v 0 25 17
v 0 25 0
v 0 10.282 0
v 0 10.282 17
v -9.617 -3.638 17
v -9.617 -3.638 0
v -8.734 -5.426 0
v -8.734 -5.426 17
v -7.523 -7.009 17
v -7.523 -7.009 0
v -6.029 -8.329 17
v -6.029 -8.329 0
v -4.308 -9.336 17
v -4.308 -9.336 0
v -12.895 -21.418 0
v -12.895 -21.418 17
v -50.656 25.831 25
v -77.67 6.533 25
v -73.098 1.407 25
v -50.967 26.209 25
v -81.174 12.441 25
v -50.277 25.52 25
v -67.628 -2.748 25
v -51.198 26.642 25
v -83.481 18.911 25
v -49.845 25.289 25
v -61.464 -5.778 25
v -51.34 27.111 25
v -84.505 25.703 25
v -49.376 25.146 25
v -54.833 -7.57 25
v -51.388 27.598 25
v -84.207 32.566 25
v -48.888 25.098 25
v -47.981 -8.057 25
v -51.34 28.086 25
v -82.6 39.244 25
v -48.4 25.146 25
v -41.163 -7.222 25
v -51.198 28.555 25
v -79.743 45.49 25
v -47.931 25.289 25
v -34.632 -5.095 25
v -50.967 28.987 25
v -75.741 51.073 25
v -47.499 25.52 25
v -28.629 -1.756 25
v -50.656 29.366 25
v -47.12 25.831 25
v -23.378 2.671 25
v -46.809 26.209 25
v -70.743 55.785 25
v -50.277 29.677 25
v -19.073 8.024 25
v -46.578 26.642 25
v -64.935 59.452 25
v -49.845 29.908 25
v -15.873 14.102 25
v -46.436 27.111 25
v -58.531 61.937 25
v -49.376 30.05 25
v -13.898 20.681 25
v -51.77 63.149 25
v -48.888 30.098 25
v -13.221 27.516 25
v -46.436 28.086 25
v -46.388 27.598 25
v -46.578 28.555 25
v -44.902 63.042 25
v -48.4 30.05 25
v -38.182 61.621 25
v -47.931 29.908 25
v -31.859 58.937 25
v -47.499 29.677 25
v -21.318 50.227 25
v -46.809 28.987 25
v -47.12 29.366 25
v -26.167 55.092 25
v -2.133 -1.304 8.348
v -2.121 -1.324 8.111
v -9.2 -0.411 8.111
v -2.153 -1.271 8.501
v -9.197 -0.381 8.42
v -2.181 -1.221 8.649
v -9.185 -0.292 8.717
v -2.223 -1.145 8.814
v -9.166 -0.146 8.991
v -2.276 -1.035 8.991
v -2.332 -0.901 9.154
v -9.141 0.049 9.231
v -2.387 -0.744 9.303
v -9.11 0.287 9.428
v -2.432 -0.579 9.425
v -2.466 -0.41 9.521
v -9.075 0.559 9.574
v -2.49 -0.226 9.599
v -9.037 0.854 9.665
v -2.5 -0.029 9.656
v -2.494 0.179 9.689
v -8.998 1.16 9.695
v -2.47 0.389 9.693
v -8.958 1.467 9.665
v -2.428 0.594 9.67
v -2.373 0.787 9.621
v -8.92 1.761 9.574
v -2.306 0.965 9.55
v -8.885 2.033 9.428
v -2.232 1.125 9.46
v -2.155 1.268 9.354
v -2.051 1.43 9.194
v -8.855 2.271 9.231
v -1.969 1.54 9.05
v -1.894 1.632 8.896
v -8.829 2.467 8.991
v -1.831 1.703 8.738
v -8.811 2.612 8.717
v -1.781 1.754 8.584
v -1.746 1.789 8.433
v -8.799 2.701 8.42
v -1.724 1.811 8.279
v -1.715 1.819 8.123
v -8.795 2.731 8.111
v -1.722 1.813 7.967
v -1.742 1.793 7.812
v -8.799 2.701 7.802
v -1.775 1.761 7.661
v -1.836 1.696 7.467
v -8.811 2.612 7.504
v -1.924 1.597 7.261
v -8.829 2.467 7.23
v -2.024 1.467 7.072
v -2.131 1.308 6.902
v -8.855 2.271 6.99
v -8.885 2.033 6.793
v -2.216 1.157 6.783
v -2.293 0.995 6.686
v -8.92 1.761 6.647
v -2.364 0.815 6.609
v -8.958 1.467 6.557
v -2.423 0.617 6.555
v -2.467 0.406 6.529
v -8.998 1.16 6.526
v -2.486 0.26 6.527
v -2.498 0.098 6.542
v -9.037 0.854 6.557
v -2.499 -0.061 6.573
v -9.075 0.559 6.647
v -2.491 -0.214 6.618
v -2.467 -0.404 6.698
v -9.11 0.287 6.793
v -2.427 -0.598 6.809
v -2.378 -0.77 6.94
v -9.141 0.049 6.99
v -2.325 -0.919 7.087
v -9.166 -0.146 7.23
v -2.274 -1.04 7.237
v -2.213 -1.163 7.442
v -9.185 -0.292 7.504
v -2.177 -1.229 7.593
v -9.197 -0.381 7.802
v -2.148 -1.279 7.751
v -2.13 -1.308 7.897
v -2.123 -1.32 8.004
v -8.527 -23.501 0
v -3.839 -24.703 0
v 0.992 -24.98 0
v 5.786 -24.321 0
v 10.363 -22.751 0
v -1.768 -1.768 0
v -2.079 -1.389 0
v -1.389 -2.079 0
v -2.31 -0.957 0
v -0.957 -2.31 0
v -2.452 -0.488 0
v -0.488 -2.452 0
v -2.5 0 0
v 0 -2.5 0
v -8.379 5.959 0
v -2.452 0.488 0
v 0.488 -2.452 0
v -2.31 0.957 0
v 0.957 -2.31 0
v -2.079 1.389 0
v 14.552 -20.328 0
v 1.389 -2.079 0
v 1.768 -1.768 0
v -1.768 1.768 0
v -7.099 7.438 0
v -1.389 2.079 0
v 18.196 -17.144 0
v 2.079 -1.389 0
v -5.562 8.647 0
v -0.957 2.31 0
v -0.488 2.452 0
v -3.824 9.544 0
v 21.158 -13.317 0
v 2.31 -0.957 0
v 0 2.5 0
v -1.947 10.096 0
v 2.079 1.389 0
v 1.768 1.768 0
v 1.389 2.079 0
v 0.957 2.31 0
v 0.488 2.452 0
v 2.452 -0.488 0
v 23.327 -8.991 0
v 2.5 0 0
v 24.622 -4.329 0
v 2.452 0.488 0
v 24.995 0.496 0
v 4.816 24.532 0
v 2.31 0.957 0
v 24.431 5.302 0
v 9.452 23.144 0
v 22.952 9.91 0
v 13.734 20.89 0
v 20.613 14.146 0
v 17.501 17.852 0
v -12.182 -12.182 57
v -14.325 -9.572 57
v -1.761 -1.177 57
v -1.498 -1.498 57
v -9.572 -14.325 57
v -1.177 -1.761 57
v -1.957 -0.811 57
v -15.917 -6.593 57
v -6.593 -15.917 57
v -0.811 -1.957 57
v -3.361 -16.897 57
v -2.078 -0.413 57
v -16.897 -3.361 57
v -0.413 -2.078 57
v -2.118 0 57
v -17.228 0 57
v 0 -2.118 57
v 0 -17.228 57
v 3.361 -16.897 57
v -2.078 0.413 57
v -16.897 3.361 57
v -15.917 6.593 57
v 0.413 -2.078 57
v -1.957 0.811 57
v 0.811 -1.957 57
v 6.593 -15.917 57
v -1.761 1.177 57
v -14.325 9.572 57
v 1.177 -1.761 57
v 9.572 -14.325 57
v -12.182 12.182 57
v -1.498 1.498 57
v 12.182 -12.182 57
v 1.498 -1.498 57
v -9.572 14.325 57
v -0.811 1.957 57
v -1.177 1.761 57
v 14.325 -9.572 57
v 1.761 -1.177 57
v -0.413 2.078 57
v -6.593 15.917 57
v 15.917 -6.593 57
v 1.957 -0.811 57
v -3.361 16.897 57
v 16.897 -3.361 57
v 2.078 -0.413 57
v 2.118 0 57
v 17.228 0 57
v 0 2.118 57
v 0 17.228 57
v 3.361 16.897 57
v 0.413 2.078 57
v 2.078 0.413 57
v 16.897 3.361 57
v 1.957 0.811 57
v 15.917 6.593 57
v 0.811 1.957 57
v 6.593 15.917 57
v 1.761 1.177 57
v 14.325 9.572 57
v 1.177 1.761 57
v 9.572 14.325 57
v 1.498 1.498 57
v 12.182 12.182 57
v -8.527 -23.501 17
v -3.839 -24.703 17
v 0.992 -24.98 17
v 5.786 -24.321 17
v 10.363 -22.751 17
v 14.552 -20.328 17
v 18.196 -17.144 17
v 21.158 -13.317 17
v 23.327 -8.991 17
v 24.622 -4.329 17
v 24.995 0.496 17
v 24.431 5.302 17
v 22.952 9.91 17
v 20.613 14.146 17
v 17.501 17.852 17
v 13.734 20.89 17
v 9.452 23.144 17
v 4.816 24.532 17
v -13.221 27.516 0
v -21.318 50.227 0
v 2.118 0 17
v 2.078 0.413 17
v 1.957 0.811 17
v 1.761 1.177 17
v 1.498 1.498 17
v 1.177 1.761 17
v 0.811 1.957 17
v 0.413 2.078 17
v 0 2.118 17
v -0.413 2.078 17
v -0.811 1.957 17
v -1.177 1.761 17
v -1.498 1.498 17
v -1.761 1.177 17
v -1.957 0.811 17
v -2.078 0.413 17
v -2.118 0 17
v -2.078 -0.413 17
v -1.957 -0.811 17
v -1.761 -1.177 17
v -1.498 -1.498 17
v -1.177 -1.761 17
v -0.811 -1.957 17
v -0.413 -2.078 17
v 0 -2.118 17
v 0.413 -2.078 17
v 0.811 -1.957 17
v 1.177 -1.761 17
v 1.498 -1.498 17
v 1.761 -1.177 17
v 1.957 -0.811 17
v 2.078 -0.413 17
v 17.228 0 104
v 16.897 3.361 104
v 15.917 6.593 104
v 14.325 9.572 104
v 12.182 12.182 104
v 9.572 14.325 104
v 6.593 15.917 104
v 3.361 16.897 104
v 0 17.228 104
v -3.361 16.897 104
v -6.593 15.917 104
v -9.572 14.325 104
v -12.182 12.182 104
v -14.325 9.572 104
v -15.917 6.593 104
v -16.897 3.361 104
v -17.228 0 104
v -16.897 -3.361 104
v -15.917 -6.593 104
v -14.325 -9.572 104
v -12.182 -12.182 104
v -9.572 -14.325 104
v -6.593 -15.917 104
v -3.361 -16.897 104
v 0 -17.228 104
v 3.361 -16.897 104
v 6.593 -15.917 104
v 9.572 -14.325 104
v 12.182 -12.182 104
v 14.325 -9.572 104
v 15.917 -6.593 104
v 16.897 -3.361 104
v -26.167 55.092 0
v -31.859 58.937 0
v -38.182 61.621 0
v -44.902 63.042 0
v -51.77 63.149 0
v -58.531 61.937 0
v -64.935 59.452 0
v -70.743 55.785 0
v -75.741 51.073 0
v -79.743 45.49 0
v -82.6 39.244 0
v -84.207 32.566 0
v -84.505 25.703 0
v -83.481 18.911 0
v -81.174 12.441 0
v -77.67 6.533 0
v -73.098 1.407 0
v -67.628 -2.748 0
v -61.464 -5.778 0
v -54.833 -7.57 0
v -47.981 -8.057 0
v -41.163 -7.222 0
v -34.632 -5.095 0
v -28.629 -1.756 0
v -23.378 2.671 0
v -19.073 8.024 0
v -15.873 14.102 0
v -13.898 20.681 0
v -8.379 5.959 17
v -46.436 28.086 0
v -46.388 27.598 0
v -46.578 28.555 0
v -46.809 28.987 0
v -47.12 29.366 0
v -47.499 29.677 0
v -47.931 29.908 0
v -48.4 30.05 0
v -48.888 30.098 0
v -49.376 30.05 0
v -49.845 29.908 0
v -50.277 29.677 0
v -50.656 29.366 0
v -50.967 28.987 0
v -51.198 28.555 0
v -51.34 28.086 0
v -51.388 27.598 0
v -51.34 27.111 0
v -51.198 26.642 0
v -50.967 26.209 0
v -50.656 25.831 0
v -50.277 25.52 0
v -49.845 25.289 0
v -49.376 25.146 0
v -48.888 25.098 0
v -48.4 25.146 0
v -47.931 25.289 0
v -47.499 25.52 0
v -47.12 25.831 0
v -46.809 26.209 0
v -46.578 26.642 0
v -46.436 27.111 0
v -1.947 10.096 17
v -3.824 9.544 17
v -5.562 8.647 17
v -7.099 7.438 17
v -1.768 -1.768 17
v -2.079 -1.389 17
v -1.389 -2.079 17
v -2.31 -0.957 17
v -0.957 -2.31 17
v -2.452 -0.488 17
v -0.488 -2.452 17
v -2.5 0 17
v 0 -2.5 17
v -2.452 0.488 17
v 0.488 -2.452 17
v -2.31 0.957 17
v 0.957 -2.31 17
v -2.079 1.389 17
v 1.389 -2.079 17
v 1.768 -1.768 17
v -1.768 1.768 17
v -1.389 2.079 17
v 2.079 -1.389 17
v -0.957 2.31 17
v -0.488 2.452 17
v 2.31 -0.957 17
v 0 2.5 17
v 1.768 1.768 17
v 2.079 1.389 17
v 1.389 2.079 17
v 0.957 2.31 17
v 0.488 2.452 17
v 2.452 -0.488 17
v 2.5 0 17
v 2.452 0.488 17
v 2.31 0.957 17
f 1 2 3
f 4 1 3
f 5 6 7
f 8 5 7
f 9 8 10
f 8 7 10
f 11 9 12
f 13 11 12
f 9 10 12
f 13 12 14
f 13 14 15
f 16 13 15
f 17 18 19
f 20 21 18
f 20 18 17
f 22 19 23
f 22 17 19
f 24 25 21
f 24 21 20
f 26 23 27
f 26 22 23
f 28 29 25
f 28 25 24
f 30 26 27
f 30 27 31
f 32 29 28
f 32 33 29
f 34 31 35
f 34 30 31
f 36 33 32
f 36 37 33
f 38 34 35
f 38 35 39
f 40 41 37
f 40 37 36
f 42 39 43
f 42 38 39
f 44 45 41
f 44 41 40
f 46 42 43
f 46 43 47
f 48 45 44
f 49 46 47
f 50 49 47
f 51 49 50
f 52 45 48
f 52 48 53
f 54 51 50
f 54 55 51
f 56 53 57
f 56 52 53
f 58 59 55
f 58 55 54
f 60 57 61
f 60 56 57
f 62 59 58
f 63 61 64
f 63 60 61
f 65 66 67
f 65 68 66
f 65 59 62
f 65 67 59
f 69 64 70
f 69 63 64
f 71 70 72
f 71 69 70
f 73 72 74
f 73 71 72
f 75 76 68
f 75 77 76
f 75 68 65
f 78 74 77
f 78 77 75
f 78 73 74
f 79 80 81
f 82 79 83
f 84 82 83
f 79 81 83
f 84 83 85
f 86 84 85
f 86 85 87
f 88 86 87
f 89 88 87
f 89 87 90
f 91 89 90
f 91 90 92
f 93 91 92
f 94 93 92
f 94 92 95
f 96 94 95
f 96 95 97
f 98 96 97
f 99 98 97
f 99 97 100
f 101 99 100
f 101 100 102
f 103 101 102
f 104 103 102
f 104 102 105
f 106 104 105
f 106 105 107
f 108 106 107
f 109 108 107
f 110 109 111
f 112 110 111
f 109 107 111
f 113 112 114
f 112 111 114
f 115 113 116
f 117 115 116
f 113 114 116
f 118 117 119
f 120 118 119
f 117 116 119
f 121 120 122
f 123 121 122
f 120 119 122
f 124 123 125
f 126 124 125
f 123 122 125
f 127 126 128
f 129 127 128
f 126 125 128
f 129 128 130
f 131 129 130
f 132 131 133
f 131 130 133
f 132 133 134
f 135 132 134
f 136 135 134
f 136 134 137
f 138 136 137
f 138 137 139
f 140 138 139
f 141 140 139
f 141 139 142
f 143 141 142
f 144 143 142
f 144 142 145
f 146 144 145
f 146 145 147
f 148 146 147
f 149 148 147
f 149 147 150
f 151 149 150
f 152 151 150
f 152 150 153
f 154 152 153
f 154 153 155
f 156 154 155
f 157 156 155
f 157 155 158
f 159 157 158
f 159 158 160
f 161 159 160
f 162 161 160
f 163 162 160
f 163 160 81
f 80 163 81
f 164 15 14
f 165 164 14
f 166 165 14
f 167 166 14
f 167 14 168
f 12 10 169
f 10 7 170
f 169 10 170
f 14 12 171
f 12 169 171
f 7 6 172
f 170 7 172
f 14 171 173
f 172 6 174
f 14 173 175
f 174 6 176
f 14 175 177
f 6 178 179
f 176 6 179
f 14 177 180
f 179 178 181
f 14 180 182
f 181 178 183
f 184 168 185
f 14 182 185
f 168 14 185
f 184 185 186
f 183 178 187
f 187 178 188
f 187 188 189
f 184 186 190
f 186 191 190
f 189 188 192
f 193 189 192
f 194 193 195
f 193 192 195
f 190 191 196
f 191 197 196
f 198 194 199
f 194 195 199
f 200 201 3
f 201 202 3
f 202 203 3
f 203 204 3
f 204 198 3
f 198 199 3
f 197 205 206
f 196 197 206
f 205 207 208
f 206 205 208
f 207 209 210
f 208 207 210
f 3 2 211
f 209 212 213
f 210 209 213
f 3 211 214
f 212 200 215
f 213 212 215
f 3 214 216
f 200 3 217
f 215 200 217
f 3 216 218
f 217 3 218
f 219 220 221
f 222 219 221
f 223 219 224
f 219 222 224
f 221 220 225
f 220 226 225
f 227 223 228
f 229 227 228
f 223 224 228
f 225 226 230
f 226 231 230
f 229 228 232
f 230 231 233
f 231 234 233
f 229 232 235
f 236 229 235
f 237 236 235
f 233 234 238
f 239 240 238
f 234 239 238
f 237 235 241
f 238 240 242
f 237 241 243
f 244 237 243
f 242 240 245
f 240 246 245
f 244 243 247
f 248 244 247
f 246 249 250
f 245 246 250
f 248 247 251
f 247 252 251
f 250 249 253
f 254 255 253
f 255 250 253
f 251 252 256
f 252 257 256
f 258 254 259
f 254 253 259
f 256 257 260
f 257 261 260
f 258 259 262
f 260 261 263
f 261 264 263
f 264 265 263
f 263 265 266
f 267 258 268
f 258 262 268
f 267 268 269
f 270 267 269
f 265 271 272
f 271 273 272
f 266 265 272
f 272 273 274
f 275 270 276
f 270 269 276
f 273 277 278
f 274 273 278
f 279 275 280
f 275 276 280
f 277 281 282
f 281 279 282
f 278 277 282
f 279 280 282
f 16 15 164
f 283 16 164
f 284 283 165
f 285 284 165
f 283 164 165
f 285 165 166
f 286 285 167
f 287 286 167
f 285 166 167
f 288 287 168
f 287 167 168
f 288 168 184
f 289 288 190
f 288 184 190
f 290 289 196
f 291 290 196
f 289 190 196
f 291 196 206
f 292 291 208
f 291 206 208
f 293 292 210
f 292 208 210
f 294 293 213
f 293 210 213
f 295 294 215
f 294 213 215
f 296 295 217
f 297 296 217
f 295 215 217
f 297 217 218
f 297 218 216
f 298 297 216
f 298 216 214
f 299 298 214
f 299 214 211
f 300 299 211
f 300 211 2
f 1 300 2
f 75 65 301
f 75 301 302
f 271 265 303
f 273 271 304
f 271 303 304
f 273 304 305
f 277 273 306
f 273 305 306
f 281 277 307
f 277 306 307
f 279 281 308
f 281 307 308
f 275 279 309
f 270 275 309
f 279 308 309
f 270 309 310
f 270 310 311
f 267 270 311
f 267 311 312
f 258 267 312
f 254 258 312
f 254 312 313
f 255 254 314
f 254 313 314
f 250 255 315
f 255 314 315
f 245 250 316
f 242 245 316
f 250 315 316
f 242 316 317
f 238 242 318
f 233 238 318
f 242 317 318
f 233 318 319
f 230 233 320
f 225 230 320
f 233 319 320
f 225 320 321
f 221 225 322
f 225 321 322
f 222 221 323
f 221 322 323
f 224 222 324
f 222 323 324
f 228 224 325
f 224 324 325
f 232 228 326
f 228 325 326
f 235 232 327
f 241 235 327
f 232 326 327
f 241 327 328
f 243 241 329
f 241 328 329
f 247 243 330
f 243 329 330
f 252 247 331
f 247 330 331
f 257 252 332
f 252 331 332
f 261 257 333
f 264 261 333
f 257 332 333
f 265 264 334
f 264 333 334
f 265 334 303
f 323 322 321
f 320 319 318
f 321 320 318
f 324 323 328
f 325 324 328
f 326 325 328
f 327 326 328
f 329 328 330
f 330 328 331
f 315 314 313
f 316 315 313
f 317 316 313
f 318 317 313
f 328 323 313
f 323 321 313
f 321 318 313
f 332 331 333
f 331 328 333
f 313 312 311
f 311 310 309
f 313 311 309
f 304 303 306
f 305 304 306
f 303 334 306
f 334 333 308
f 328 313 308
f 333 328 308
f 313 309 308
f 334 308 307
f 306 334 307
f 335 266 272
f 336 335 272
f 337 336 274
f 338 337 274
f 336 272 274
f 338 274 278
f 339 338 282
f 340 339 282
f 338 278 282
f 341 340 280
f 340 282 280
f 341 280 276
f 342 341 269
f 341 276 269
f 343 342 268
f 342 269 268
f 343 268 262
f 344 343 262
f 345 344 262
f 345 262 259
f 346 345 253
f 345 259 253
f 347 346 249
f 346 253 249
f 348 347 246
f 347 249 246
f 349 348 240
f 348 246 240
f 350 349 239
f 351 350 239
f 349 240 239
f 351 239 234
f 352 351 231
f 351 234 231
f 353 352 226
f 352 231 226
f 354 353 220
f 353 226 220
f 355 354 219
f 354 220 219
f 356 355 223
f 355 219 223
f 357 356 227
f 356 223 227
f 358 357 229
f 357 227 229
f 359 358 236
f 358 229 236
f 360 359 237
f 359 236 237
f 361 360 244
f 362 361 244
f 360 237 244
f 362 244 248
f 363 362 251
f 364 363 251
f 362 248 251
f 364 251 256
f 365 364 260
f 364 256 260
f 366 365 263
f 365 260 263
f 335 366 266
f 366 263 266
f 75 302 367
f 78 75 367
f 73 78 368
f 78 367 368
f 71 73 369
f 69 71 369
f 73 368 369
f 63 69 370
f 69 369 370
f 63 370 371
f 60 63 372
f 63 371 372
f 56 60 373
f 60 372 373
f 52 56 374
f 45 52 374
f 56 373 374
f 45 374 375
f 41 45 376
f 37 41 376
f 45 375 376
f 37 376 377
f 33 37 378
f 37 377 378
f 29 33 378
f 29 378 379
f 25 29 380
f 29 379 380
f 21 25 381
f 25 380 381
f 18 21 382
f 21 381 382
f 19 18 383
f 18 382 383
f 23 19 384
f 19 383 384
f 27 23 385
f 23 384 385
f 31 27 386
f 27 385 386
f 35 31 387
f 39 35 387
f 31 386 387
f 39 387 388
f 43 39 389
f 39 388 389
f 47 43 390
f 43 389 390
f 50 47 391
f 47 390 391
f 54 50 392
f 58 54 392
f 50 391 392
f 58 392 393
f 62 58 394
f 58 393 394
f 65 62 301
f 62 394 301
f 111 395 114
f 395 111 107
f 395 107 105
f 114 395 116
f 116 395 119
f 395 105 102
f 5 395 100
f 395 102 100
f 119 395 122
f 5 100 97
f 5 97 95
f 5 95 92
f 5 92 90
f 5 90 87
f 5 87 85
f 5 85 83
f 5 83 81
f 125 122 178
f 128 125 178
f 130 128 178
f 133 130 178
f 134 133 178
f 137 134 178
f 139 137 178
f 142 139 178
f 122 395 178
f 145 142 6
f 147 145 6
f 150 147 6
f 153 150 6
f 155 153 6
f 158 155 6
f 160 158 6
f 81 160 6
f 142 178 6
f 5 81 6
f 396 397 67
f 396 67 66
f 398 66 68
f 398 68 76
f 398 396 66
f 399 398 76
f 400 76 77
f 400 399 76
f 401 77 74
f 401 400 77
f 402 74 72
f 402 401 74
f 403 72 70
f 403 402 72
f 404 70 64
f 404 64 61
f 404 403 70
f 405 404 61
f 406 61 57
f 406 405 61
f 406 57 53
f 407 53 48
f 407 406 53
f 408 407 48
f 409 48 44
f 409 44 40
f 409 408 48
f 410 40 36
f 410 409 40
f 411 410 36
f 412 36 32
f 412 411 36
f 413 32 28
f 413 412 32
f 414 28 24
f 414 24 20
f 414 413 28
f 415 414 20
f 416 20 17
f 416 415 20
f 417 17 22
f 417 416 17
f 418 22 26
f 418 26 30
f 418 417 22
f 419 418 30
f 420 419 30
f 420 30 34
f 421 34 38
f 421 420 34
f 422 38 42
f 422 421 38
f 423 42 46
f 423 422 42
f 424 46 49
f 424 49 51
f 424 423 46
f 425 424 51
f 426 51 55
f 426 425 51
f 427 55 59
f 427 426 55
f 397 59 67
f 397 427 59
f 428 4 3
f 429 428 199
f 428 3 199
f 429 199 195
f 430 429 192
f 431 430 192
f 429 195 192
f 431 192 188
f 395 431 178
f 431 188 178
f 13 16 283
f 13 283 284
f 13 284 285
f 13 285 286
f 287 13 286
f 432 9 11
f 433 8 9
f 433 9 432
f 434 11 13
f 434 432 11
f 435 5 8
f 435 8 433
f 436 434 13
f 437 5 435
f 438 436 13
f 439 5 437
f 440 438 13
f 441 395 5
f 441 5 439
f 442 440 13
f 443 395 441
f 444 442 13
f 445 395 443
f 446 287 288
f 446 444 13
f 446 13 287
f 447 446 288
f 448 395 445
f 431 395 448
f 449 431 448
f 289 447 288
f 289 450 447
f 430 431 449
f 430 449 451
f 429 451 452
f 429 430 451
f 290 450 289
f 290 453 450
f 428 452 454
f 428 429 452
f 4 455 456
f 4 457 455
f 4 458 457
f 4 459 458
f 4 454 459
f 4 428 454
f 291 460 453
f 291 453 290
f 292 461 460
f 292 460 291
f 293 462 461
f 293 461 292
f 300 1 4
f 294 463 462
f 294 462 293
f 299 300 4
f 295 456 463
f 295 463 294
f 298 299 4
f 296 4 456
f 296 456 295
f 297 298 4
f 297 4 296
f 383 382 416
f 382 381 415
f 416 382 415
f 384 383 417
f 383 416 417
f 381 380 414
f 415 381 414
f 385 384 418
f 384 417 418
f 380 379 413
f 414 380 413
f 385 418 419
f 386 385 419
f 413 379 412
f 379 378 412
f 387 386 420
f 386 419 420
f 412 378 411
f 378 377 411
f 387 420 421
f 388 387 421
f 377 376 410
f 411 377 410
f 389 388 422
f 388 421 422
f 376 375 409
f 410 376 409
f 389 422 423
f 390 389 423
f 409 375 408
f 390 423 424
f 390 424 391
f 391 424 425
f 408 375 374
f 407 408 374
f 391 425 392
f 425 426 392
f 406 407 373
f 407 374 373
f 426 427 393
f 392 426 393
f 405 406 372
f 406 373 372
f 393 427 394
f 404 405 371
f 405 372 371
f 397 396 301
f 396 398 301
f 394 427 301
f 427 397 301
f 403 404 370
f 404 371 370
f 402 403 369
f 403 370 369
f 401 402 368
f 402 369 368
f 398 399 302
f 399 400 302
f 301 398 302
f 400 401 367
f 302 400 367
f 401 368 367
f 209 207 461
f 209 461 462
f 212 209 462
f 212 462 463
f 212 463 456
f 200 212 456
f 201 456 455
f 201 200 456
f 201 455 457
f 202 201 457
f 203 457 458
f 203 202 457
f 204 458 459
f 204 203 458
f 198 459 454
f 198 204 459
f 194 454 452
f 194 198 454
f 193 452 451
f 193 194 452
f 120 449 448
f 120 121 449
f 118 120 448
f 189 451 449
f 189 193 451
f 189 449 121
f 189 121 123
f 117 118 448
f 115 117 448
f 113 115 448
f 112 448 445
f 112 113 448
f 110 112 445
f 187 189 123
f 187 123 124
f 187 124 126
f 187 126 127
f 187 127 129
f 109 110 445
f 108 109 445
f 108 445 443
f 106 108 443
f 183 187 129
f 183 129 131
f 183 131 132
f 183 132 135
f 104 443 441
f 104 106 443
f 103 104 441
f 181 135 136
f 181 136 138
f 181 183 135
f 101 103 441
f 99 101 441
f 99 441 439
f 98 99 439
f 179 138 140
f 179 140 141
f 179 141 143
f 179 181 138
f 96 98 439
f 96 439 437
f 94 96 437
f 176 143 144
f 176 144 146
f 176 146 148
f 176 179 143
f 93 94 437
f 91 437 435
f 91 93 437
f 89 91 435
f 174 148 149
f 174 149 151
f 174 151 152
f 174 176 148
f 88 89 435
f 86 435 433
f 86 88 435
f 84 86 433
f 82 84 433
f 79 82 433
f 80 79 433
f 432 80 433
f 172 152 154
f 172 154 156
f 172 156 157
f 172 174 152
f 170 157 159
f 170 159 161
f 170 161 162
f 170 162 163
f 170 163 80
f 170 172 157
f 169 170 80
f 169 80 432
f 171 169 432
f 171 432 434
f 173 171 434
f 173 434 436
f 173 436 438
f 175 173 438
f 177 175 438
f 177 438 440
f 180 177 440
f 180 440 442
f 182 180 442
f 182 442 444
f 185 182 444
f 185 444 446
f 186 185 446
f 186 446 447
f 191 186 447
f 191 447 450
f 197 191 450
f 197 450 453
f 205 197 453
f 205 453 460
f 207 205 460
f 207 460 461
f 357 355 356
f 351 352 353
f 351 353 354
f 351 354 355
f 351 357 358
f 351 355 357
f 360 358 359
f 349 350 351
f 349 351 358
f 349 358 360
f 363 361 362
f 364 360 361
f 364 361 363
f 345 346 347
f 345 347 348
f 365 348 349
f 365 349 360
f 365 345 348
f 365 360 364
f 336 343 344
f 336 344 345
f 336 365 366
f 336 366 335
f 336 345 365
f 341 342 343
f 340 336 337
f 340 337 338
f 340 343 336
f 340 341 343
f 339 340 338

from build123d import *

# Parameters (mm, degrees)
F0_R     = 2.5
F1_DEPTH = 17
F2_R     = 2.1183628734
F3_DEPTH = 40
F4_R     = 17.2283151163
F4_R_2   = 2.1183628734
F5_DEPTH = 47
F6_R     = 1.5843133583
F7_DEPTH = 7.1394056178
F8_DEPTH = 25


with BuildPart() as f1:
    # F0 (on Top) → F1 (new body)
    with BuildSketch(Plane.XY):
        with BuildLine():
            Line((-4.3080339444, -9.3356588295), (-12.8947155097, -21.4178970005))
            ThreePointArc((-12.8947155097, -21.4178970005), (24.0878332879, -6.6915086112), (0, 25))
            Line((0, 25), (0, 10.2817159194))
            ThreePointArc((0, 10.2817159194), (-4.7143324855, 9.1372179279), (-8.3791234153, 5.9585210444))
            Line((-8.3791234153, 5.9585210444), (-9.6165060123, -3.6381993296))
            ThreePointArc((-9.6165060123, -3.6381993296), (-7.5225304545, -7.0089384223), (-4.3080339444, -9.3356588295))
        make_face()
        Circle(F0_R, mode=Mode.SUBTRACT)
    extrude(amount=F1_DEPTH)

    # F6 (on face) → F7 (cut, through all)
    with BuildSketch(Plane(origin=(-8.9978147138, 1.1601608574, 0), x_dir=(-0.1278794515, -0.9917897186, 0), z_dir=(-0.9917897186, 0.1278794515, 0))):
        with Locations((0, 8.1106387079)):
            Circle(F6_R)
    extrude(amount=-F7_DEPTH, mode=Mode.SUBTRACT)


with BuildPart() as f3:
    # F2 (on face) → F3 (new body)
    with BuildSketch(Plane.XY.offset(17)):
        Circle(F2_R)
    extrude(amount=F3_DEPTH)

    # F4 (on face) → F5 (join)
    with BuildSketch(Plane.XY.offset(57)):
        Circle(F4_R)
        Circle(F4_R_2, mode=Mode.SUBTRACT)
        Circle(F4_R_2)
    extrude(amount=F5_DEPTH)


with BuildPart() as f8:
    # F0 (on Top) → F8 (new body)
    with BuildSketch(Plane.XY):
        with BuildLine():
            Line((-13.2212148814, 27.5161545188), (-21.3183985313, 50.226792498))
            ThreePointArc((-21.3183985313, 50.226792498), (-82.4834983749, 15.6203768895), (-13.2212148814, 27.5161545188))
        make_face()
        with Locations((-48.8880313933, 27.5984052569)):
            Circle(F0_R, mode=Mode.SUBTRACT)
    extrude(amount=F8_DEPTH)


solid = Compound([f1.part, f3.part, f8.part])
